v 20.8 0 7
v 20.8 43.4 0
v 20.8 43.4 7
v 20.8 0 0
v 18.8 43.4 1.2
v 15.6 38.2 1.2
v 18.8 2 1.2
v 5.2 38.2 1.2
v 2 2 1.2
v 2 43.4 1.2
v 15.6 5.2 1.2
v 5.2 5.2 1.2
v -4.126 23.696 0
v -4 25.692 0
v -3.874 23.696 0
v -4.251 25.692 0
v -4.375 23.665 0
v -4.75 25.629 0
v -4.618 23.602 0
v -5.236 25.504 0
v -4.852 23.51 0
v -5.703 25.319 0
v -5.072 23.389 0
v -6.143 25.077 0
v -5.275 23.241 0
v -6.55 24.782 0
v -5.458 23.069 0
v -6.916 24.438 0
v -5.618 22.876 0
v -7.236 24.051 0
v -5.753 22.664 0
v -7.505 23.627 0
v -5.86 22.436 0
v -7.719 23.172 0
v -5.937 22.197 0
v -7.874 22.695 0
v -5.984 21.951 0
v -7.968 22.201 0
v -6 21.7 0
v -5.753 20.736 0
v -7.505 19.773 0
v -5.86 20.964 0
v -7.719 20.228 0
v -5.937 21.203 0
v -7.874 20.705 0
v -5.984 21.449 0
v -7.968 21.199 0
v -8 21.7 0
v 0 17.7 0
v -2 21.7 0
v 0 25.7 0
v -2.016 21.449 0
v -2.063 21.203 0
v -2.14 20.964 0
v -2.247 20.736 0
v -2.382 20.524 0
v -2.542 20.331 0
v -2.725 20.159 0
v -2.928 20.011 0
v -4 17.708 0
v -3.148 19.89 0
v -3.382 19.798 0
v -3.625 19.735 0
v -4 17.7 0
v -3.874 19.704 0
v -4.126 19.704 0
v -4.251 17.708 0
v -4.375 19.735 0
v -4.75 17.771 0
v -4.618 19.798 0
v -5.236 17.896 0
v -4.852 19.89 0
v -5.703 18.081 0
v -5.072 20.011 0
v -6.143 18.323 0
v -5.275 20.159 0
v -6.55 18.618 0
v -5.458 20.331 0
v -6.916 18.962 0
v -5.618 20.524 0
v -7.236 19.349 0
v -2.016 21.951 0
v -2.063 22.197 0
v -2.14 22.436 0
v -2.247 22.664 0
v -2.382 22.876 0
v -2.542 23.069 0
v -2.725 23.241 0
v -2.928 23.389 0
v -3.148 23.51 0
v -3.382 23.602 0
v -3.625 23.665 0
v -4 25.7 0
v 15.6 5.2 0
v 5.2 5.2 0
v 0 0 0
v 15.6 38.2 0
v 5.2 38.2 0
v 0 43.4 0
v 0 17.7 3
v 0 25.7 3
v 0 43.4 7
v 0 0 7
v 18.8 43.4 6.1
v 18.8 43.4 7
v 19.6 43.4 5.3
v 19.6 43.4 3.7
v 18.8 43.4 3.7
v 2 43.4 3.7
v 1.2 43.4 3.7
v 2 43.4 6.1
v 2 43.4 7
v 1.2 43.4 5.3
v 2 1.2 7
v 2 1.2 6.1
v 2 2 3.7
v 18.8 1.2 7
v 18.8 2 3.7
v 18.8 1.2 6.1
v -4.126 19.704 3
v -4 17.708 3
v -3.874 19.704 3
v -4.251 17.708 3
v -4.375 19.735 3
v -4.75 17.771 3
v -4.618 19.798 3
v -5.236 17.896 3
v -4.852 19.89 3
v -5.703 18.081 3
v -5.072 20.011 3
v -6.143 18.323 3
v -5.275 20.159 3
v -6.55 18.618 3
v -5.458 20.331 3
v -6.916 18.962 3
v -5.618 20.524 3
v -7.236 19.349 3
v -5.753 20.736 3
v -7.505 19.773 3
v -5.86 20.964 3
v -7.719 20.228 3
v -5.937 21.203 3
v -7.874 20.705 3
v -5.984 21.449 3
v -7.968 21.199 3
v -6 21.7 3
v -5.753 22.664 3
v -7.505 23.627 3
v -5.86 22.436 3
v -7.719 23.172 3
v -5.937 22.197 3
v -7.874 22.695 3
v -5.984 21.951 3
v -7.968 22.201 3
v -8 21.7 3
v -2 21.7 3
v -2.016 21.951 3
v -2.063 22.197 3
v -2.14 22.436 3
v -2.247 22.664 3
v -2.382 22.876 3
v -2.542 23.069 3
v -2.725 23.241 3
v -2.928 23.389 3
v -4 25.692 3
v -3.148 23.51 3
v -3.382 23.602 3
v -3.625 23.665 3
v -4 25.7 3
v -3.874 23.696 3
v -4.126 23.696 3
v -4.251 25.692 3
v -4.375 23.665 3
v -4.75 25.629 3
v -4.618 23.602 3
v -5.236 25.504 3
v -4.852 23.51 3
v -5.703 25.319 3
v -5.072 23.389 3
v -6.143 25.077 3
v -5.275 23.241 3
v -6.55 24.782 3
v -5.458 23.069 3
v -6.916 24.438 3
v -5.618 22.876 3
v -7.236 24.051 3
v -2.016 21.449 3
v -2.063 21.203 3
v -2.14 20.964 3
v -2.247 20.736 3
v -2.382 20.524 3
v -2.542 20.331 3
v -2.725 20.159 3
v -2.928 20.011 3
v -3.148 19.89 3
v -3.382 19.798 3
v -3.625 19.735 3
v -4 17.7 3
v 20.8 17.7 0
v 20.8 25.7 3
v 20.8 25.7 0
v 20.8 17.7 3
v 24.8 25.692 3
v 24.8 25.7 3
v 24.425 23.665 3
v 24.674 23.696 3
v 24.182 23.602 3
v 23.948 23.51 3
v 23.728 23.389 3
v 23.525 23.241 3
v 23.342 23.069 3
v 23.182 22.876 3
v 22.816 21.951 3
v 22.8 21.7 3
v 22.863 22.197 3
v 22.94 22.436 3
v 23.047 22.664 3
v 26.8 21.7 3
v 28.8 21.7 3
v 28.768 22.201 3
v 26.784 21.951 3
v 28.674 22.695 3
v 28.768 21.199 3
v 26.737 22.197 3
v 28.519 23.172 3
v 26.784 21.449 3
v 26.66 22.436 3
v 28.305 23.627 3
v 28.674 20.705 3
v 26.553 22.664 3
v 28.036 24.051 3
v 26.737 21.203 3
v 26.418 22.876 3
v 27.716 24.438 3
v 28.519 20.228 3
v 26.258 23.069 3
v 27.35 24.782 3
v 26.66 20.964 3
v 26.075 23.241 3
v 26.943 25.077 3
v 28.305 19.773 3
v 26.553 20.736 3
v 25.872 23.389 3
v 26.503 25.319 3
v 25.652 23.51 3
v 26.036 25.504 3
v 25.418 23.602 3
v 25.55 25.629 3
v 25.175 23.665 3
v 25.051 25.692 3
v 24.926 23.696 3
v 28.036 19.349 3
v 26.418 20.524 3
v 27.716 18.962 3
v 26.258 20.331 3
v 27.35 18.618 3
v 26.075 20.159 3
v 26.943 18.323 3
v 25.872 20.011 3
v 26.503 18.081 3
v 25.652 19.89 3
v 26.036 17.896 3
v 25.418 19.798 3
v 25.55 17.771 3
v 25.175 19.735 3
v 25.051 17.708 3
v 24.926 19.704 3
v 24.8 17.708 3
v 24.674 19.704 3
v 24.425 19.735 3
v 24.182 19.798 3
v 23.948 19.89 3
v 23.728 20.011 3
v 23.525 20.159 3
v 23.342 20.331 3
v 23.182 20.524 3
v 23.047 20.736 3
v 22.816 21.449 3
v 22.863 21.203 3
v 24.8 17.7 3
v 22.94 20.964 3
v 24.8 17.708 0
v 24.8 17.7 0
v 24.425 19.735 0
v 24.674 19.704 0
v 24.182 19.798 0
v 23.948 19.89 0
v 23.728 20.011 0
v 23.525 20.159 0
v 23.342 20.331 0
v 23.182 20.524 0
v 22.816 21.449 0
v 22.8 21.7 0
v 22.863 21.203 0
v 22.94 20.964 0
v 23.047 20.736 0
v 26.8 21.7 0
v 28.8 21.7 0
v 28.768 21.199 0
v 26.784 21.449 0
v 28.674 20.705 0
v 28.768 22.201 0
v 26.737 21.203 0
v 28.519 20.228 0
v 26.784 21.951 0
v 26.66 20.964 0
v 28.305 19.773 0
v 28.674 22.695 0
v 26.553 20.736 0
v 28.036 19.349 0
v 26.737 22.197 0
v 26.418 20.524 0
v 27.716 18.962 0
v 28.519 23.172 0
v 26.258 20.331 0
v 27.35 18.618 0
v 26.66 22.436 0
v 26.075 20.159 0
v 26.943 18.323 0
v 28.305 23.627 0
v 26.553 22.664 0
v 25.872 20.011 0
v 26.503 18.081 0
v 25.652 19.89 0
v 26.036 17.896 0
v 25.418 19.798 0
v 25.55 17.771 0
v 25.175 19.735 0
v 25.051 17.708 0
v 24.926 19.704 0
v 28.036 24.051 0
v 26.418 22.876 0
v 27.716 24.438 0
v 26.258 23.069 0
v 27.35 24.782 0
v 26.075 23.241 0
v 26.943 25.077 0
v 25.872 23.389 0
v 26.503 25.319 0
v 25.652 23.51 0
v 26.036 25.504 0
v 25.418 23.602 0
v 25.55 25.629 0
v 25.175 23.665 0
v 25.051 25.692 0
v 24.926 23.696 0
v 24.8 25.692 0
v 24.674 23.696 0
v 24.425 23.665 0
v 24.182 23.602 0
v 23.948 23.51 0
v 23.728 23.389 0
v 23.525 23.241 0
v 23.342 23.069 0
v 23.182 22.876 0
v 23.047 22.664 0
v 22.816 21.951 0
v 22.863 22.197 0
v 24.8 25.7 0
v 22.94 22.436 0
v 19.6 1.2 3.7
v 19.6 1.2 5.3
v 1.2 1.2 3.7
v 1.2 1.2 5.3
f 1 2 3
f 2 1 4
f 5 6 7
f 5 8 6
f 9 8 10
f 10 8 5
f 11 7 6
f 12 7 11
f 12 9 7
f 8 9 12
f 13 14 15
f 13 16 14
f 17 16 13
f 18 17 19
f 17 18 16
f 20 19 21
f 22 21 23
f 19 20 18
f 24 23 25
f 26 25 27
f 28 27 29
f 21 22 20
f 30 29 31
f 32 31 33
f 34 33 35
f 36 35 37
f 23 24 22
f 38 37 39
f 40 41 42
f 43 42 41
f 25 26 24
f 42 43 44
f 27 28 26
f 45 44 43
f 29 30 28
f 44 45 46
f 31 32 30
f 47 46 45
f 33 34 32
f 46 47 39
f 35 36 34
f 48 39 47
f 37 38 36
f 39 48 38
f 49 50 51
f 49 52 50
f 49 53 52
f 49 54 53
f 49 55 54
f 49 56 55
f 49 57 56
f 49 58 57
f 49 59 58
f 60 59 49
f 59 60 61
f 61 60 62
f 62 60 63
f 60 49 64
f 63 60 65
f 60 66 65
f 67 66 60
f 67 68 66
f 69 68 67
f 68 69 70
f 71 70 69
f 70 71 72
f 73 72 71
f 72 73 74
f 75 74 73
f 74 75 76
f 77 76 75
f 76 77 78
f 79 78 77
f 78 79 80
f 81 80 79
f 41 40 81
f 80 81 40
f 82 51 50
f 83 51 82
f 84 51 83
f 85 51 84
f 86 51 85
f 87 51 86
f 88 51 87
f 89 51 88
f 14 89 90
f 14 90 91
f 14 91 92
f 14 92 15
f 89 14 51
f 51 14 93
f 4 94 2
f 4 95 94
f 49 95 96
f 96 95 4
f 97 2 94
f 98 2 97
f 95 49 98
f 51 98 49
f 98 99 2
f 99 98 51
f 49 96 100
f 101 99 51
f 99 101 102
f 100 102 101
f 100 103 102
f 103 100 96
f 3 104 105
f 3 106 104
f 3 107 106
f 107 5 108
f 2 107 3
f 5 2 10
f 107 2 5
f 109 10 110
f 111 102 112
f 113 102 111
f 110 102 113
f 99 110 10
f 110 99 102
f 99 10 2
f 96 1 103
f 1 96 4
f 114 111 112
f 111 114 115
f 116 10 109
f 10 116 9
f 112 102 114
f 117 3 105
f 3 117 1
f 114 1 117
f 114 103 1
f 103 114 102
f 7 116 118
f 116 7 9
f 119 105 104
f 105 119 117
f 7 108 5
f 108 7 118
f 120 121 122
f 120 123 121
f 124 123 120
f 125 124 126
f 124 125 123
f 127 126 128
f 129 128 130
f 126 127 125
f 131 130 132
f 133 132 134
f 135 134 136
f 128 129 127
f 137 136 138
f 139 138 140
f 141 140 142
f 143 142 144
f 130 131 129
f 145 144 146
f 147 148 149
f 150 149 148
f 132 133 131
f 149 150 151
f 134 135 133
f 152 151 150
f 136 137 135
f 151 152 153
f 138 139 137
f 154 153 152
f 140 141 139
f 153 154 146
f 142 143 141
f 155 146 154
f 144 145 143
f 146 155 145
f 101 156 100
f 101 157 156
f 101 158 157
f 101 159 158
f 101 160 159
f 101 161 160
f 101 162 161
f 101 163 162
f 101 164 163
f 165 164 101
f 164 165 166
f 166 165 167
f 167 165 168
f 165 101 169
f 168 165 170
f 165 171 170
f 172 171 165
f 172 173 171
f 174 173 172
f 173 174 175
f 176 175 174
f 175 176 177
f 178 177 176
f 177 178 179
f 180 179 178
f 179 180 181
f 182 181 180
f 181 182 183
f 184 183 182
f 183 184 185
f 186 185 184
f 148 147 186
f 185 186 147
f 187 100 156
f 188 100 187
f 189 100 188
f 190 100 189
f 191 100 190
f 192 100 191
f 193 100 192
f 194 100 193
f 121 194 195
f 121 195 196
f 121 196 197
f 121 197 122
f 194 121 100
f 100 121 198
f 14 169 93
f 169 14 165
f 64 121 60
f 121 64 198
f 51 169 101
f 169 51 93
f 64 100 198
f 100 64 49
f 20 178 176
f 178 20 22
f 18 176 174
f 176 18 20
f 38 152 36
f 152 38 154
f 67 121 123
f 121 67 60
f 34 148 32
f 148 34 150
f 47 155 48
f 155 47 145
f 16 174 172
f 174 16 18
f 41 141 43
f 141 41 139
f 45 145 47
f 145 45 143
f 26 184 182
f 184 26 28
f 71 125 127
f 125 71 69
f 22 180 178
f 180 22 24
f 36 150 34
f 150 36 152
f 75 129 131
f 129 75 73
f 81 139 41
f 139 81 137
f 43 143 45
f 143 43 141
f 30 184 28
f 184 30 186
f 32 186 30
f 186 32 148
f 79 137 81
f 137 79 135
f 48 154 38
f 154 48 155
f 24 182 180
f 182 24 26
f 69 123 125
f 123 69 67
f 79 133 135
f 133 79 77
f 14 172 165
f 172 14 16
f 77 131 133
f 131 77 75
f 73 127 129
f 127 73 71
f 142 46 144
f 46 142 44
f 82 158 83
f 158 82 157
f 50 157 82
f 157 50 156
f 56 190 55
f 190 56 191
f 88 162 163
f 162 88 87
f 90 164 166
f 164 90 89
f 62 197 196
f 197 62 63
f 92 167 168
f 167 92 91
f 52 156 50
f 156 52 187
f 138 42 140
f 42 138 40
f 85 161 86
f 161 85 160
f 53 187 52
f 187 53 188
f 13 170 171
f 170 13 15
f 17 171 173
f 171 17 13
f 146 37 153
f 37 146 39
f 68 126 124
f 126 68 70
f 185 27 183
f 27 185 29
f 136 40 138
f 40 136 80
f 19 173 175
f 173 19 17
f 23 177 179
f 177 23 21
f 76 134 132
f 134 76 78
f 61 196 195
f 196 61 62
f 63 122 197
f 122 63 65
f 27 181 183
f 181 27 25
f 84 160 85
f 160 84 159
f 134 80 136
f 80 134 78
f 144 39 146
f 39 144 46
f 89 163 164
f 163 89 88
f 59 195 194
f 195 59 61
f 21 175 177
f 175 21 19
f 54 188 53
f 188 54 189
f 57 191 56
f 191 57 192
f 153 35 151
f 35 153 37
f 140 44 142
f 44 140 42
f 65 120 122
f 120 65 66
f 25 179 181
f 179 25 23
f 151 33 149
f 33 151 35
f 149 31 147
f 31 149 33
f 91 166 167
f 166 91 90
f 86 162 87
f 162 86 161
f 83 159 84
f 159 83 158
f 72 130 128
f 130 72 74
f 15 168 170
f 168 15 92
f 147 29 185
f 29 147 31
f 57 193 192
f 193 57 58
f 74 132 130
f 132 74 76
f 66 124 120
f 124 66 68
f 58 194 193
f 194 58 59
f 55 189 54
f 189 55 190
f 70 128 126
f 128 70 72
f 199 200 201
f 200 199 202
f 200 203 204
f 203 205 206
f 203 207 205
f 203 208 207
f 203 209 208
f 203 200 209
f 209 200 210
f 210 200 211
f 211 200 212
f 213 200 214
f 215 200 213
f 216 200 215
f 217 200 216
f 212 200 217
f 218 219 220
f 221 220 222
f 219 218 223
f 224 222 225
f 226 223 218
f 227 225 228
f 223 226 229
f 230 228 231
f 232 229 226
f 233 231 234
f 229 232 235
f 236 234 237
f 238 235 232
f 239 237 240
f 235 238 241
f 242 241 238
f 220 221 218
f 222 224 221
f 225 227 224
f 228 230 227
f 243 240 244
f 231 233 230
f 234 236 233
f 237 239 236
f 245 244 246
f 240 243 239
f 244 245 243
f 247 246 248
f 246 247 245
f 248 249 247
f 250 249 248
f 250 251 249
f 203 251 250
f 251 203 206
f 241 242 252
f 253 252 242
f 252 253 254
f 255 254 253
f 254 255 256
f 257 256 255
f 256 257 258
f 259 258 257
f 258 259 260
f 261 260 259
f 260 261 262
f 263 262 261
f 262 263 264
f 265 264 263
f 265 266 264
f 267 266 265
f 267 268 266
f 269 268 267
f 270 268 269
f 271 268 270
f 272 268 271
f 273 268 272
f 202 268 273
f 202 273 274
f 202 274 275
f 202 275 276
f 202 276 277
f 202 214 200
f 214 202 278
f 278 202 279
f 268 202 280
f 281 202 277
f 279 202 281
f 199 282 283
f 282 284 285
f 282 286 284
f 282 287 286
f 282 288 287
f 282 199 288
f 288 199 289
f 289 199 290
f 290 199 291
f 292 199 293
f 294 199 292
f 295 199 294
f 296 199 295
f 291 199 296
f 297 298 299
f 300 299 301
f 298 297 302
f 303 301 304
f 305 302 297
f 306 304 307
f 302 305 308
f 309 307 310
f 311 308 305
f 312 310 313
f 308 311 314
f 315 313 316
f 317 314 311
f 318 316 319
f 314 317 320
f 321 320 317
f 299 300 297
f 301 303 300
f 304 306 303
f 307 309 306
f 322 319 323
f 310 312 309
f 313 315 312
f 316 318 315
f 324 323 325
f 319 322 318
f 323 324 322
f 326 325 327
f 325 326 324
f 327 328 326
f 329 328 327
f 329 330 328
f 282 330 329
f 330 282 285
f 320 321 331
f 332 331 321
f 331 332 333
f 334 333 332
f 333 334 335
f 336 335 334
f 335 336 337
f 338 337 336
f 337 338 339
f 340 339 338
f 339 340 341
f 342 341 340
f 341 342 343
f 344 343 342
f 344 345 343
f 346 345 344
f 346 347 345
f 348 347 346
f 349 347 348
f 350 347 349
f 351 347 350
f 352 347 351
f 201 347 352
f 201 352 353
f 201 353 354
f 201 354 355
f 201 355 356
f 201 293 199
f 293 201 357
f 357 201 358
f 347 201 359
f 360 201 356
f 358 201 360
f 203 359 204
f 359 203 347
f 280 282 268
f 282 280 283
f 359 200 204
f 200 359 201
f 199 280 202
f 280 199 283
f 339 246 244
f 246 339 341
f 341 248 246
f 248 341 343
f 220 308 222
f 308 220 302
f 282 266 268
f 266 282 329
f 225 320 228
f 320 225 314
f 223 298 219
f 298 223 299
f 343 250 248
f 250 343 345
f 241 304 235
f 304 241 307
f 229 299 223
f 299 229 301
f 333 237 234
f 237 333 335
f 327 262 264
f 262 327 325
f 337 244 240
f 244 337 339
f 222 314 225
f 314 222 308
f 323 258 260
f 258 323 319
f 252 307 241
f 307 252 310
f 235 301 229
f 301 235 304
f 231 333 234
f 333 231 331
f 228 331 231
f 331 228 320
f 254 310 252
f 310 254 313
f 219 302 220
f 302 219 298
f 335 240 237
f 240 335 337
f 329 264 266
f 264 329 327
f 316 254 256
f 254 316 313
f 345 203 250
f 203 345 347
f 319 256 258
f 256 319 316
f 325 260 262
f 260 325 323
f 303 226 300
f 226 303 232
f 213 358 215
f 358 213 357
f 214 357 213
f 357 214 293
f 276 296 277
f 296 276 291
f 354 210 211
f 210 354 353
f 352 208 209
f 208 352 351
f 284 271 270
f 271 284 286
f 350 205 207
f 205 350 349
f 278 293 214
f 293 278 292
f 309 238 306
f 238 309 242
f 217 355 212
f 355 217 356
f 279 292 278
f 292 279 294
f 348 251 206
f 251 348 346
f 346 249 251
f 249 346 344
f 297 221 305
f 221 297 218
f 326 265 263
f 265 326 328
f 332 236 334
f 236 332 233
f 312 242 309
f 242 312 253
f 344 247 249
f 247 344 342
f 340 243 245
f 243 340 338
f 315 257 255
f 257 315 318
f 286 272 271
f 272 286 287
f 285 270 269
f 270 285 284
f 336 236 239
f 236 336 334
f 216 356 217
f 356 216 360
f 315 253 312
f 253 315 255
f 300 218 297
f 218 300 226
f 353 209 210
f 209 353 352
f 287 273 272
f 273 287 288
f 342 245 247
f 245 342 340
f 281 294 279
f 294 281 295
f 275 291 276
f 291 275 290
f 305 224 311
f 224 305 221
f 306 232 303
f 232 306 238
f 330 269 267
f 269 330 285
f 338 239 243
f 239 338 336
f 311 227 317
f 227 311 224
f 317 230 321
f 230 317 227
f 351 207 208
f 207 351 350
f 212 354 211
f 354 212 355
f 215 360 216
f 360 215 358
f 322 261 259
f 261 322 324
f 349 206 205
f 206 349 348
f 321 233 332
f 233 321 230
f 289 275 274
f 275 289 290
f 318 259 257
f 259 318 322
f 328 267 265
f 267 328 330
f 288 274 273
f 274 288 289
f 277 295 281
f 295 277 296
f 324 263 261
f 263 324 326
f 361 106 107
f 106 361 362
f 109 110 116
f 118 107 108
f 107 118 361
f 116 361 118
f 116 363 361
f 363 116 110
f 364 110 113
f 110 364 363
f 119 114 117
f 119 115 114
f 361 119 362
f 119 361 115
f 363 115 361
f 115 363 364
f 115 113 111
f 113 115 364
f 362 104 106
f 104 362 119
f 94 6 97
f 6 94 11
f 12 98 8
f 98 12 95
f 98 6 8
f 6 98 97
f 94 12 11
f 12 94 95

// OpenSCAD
// file: ../lib/pcb_led_cvf.scad
// for led power module modified

/* bluetooth_mate_holder.scad
 * By John Biehler - November 17, 2011
 * http://www.thingiverse.com/thing:

 * derived from pcb_box_slide_with_tabs.scad
 * By Nicholas C Lewis - Jan 1, 2011
 * http://www.thingiverse.com/thing:5396
 *
 * derived from pcb_box_slide.scad
 *     Parametric, open PCB-box (slide-in) by chlunde
 *     http://www.thingiverse.com/thing:4071
 *
 * CHANGES
 * - adjusted to fit Arduino Mega
 * - added mounting tabs
 * - turned off cutouts
 * - adjusted bottom cutout size
 */

$fn=50;

module pcb_led_cvf(

	pcb_width = 48.2,
	pcb_length =24.1,
	pcb_height =1.1,
	slisse = 0.8,

	pcb_bottom_margin = 1,
	wall_width_thick = 2,
	box_height = 7,

	//tab parameters
	tab_hole_radius=2,
	tab_outer_radius=4,

	inner_margin = 4,

	add_tabs = true

) {
	wall_width = wall_width_thick-slisse;

module tab() {
	difference(){
		union() {
			translate([-tab_outer_radius,-tab_outer_radius,0])
			cube([tab_outer_radius,2*tab_outer_radius,wall_width_thick+1]);
			translate([-tab_outer_radius,0,0])
				cylinder(r=tab_outer_radius, h = wall_width_thick+1);
		}
		translate([-tab_outer_radius,0,0]) {
			cylinder(r= tab_hole_radius, h = wall_width_thick+5,center=true);
		}
	}

}

module box() {
	union() {
		cube([pcb_width + 2*wall_width, pcb_length + 2*wall_width, wall_width]);

		cube([wall_width_thick, pcb_length + 2*wall_width, box_height]);

		cube([pcb_width + 2*wall_width, wall_width_thick, box_height]);

		%translate([0, pcb_length+wall_width, 0])
			cube([pcb_width + 2*wall_width,wall_width,box_height]);

		translate([pcb_width + wall_width - slisse,0,0])
			cube([wall_width_thick, pcb_length + 2*wall_width, box_height]);
	}
	if(add_tabs) {
//comment out this part to remove tabs
		for(i=[(pcb_length + 2*wall_width)/2]){
	translate([0,i,0])tab();
	translate([pcb_width + 2*wall_width,i,0])mirror()tab();
		}
	}

}

module pcb() {
	translate([wall_width, wall_width, wall_width + pcb_bottom_margin])
		cube([pcb_width,pcb_length + wall_width + 0.1,pcb_height]);
	translate([wall_width, wall_width, wall_width + pcb_bottom_margin+pcb_height])rotate([0,45,0])
		cube([pcb_height,pcb_length + wall_width + 0.1,pcb_height]);
	translate([wall_width+pcb_width-2*cos(45)*pcb_height, wall_width, wall_width + pcb_bottom_margin+pcb_height])rotate([0,45,0])
		cube([pcb_height,pcb_length + wall_width + 0.1,pcb_height]);
	translate([wall_width_thick, wall_width, wall_width + pcb_bottom_margin])
		cube([pcb_width-2*slisse,pcb_length + wall_width + 0.1,box_height]);

}



module holes() {
		*translate([wall_width + pcb_width/2, wall_width_thick + 0.1, pcb_width/2+wall_width])
			rotate(a=90,v=[1,0,0])
				cylinder(r=pcb_width/2, h=wall_width_thick + 0.2);

		*translate([-0.1, wall_width + pcb_length/2, pcb_length/2 + wall_width])
			rotate(a=90,v=[0,1,0])
				cylinder(r=pcb_length/2, h=wall_width_thick + 0.2);

		*translate([pcb_width + wall_width - slisse - 0.1, wall_width + pcb_length/2, pcb_length/2 + wall_width])
			rotate(a=90,v=[0,1,0])
				cylinder(r=pcb_length/2, h=wall_width_thick + 0.2);

	 * translate([pcb_width/2 + wall_width, wall_width + pcb_length/2, -0.1])
			rotate(a=0,v=[0,1,0])
				cylinder(r=min(pcb_length,pcb_width)/2 - wall_width/2, h=wall_width_thick + 0.2);

		translate([inner_margin +wall_width, inner_margin+wall_width, -0.1])
			cube([pcb_width-inner_margin*2,pcb_length -inner_margin*2,wall_width + 0.2]);
}

	difference() {
		box();
		pcb();
		holes();
	}
}



pcb_led_cvf();
// main file
use <../lib/pcb_led_cvf.scad>

$fn = 50;

pcb_led_cvf(
  pcb_length=41,
  pcb_width=18.4,
  pcb_height=1.6,
  pcb_bottom_margin=2.5
);
